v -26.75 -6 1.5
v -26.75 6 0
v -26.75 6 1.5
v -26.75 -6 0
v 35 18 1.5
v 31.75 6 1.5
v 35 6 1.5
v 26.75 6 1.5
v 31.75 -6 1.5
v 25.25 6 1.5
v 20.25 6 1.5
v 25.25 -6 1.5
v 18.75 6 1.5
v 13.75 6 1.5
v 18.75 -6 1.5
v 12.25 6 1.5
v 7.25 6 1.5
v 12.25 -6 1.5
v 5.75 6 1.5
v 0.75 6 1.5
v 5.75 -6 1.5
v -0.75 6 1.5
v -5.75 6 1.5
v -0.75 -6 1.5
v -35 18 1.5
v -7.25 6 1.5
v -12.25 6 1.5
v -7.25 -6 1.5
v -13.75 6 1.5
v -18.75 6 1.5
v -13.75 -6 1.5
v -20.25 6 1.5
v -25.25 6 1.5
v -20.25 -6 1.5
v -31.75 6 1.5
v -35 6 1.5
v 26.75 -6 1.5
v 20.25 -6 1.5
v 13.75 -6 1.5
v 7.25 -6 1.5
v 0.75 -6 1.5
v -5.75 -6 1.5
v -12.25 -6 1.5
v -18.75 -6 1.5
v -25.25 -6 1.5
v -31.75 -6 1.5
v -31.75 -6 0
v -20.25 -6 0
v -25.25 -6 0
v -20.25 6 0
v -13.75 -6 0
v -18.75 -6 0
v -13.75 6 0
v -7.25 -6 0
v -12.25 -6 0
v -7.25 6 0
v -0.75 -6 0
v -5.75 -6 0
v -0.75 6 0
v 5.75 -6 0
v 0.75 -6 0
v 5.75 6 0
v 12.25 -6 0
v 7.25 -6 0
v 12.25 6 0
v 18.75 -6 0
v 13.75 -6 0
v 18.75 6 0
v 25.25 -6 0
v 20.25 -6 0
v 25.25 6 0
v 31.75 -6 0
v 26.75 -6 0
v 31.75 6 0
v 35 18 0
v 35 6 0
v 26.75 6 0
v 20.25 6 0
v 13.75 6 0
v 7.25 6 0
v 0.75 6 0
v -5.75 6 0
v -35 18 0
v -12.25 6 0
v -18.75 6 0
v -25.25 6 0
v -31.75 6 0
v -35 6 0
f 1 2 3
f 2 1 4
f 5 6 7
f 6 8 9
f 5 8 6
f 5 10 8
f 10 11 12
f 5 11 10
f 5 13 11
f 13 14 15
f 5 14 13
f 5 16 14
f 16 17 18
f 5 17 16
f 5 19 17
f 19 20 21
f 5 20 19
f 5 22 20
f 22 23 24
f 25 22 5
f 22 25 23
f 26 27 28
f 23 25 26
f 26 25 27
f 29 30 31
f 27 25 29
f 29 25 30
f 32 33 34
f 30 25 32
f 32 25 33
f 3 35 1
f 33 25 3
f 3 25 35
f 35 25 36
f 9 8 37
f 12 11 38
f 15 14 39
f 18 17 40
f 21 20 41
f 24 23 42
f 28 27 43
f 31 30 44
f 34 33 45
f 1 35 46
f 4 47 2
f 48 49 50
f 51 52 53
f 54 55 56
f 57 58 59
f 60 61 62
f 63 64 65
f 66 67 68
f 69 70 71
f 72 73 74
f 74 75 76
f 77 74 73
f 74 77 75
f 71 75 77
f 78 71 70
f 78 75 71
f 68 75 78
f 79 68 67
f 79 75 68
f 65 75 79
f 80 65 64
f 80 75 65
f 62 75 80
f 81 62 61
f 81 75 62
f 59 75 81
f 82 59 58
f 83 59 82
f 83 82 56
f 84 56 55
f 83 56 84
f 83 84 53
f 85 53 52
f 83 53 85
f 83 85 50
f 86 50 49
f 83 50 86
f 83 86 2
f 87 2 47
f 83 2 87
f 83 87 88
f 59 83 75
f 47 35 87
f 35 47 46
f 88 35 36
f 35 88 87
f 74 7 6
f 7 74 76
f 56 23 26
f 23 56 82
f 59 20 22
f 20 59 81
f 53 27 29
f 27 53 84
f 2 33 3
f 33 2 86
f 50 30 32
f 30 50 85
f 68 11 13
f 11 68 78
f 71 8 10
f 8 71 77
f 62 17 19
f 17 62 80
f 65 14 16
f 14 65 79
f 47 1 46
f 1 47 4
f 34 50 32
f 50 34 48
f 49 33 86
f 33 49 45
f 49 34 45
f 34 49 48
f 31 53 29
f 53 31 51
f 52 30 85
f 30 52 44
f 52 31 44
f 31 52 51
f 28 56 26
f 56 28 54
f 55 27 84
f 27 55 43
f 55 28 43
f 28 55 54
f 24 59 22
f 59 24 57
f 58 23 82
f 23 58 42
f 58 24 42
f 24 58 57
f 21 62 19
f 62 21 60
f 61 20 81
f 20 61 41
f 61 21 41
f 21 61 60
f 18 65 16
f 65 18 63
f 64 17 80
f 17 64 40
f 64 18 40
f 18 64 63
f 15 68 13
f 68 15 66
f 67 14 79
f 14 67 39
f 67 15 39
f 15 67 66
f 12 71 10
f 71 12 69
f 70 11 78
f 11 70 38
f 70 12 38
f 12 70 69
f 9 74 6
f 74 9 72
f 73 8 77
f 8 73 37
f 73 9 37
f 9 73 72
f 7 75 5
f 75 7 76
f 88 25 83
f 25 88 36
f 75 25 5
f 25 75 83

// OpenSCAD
$fn = 64;

// Dimensions in millimeters
spine_length = 70.0;      // Spine length (X direction)
spine_width = 12.0;         // Spine width (Y direction)
tooth_width = 5.0;        // Tooth width (X direction)
tooth_length = 12.0;       // Tooth length (Y direction, extending -Y)
gap = 1.5;                // Gap between teeth (X direction)
thickness = 1.5;          // Comb thickness (Z direction)

// Total X length for teeth (10 teeth + 9 gaps)
total_teeth_length = 10 * tooth_width + 9 * gap;

union() {
    // Spine: centered at origin (X), positioned at Y = spine_width/2 (so spans Y=0 to spine_width)
    translate([-spine_length/2, spine_width/2, 0])
        cube([spine_length, spine_width, thickness]);
    
    // Teeth: 10 teeth, centered on spine in X, each extending -Y from spine edge
    for (i = [0:9]) {
        // Calculate X position for this tooth (centered on spine)
        x_pos = -spine_length/2 + (spine_length - total_teeth_length)/2 + i * (tooth_width + gap);
        // Y position: centered at -tooth_length/2 (so spans Y=-tooth_length to 0)
        translate([x_pos, -tooth_length/2, 0])
            cube([tooth_width, tooth_length, thickness]);
    }
}
